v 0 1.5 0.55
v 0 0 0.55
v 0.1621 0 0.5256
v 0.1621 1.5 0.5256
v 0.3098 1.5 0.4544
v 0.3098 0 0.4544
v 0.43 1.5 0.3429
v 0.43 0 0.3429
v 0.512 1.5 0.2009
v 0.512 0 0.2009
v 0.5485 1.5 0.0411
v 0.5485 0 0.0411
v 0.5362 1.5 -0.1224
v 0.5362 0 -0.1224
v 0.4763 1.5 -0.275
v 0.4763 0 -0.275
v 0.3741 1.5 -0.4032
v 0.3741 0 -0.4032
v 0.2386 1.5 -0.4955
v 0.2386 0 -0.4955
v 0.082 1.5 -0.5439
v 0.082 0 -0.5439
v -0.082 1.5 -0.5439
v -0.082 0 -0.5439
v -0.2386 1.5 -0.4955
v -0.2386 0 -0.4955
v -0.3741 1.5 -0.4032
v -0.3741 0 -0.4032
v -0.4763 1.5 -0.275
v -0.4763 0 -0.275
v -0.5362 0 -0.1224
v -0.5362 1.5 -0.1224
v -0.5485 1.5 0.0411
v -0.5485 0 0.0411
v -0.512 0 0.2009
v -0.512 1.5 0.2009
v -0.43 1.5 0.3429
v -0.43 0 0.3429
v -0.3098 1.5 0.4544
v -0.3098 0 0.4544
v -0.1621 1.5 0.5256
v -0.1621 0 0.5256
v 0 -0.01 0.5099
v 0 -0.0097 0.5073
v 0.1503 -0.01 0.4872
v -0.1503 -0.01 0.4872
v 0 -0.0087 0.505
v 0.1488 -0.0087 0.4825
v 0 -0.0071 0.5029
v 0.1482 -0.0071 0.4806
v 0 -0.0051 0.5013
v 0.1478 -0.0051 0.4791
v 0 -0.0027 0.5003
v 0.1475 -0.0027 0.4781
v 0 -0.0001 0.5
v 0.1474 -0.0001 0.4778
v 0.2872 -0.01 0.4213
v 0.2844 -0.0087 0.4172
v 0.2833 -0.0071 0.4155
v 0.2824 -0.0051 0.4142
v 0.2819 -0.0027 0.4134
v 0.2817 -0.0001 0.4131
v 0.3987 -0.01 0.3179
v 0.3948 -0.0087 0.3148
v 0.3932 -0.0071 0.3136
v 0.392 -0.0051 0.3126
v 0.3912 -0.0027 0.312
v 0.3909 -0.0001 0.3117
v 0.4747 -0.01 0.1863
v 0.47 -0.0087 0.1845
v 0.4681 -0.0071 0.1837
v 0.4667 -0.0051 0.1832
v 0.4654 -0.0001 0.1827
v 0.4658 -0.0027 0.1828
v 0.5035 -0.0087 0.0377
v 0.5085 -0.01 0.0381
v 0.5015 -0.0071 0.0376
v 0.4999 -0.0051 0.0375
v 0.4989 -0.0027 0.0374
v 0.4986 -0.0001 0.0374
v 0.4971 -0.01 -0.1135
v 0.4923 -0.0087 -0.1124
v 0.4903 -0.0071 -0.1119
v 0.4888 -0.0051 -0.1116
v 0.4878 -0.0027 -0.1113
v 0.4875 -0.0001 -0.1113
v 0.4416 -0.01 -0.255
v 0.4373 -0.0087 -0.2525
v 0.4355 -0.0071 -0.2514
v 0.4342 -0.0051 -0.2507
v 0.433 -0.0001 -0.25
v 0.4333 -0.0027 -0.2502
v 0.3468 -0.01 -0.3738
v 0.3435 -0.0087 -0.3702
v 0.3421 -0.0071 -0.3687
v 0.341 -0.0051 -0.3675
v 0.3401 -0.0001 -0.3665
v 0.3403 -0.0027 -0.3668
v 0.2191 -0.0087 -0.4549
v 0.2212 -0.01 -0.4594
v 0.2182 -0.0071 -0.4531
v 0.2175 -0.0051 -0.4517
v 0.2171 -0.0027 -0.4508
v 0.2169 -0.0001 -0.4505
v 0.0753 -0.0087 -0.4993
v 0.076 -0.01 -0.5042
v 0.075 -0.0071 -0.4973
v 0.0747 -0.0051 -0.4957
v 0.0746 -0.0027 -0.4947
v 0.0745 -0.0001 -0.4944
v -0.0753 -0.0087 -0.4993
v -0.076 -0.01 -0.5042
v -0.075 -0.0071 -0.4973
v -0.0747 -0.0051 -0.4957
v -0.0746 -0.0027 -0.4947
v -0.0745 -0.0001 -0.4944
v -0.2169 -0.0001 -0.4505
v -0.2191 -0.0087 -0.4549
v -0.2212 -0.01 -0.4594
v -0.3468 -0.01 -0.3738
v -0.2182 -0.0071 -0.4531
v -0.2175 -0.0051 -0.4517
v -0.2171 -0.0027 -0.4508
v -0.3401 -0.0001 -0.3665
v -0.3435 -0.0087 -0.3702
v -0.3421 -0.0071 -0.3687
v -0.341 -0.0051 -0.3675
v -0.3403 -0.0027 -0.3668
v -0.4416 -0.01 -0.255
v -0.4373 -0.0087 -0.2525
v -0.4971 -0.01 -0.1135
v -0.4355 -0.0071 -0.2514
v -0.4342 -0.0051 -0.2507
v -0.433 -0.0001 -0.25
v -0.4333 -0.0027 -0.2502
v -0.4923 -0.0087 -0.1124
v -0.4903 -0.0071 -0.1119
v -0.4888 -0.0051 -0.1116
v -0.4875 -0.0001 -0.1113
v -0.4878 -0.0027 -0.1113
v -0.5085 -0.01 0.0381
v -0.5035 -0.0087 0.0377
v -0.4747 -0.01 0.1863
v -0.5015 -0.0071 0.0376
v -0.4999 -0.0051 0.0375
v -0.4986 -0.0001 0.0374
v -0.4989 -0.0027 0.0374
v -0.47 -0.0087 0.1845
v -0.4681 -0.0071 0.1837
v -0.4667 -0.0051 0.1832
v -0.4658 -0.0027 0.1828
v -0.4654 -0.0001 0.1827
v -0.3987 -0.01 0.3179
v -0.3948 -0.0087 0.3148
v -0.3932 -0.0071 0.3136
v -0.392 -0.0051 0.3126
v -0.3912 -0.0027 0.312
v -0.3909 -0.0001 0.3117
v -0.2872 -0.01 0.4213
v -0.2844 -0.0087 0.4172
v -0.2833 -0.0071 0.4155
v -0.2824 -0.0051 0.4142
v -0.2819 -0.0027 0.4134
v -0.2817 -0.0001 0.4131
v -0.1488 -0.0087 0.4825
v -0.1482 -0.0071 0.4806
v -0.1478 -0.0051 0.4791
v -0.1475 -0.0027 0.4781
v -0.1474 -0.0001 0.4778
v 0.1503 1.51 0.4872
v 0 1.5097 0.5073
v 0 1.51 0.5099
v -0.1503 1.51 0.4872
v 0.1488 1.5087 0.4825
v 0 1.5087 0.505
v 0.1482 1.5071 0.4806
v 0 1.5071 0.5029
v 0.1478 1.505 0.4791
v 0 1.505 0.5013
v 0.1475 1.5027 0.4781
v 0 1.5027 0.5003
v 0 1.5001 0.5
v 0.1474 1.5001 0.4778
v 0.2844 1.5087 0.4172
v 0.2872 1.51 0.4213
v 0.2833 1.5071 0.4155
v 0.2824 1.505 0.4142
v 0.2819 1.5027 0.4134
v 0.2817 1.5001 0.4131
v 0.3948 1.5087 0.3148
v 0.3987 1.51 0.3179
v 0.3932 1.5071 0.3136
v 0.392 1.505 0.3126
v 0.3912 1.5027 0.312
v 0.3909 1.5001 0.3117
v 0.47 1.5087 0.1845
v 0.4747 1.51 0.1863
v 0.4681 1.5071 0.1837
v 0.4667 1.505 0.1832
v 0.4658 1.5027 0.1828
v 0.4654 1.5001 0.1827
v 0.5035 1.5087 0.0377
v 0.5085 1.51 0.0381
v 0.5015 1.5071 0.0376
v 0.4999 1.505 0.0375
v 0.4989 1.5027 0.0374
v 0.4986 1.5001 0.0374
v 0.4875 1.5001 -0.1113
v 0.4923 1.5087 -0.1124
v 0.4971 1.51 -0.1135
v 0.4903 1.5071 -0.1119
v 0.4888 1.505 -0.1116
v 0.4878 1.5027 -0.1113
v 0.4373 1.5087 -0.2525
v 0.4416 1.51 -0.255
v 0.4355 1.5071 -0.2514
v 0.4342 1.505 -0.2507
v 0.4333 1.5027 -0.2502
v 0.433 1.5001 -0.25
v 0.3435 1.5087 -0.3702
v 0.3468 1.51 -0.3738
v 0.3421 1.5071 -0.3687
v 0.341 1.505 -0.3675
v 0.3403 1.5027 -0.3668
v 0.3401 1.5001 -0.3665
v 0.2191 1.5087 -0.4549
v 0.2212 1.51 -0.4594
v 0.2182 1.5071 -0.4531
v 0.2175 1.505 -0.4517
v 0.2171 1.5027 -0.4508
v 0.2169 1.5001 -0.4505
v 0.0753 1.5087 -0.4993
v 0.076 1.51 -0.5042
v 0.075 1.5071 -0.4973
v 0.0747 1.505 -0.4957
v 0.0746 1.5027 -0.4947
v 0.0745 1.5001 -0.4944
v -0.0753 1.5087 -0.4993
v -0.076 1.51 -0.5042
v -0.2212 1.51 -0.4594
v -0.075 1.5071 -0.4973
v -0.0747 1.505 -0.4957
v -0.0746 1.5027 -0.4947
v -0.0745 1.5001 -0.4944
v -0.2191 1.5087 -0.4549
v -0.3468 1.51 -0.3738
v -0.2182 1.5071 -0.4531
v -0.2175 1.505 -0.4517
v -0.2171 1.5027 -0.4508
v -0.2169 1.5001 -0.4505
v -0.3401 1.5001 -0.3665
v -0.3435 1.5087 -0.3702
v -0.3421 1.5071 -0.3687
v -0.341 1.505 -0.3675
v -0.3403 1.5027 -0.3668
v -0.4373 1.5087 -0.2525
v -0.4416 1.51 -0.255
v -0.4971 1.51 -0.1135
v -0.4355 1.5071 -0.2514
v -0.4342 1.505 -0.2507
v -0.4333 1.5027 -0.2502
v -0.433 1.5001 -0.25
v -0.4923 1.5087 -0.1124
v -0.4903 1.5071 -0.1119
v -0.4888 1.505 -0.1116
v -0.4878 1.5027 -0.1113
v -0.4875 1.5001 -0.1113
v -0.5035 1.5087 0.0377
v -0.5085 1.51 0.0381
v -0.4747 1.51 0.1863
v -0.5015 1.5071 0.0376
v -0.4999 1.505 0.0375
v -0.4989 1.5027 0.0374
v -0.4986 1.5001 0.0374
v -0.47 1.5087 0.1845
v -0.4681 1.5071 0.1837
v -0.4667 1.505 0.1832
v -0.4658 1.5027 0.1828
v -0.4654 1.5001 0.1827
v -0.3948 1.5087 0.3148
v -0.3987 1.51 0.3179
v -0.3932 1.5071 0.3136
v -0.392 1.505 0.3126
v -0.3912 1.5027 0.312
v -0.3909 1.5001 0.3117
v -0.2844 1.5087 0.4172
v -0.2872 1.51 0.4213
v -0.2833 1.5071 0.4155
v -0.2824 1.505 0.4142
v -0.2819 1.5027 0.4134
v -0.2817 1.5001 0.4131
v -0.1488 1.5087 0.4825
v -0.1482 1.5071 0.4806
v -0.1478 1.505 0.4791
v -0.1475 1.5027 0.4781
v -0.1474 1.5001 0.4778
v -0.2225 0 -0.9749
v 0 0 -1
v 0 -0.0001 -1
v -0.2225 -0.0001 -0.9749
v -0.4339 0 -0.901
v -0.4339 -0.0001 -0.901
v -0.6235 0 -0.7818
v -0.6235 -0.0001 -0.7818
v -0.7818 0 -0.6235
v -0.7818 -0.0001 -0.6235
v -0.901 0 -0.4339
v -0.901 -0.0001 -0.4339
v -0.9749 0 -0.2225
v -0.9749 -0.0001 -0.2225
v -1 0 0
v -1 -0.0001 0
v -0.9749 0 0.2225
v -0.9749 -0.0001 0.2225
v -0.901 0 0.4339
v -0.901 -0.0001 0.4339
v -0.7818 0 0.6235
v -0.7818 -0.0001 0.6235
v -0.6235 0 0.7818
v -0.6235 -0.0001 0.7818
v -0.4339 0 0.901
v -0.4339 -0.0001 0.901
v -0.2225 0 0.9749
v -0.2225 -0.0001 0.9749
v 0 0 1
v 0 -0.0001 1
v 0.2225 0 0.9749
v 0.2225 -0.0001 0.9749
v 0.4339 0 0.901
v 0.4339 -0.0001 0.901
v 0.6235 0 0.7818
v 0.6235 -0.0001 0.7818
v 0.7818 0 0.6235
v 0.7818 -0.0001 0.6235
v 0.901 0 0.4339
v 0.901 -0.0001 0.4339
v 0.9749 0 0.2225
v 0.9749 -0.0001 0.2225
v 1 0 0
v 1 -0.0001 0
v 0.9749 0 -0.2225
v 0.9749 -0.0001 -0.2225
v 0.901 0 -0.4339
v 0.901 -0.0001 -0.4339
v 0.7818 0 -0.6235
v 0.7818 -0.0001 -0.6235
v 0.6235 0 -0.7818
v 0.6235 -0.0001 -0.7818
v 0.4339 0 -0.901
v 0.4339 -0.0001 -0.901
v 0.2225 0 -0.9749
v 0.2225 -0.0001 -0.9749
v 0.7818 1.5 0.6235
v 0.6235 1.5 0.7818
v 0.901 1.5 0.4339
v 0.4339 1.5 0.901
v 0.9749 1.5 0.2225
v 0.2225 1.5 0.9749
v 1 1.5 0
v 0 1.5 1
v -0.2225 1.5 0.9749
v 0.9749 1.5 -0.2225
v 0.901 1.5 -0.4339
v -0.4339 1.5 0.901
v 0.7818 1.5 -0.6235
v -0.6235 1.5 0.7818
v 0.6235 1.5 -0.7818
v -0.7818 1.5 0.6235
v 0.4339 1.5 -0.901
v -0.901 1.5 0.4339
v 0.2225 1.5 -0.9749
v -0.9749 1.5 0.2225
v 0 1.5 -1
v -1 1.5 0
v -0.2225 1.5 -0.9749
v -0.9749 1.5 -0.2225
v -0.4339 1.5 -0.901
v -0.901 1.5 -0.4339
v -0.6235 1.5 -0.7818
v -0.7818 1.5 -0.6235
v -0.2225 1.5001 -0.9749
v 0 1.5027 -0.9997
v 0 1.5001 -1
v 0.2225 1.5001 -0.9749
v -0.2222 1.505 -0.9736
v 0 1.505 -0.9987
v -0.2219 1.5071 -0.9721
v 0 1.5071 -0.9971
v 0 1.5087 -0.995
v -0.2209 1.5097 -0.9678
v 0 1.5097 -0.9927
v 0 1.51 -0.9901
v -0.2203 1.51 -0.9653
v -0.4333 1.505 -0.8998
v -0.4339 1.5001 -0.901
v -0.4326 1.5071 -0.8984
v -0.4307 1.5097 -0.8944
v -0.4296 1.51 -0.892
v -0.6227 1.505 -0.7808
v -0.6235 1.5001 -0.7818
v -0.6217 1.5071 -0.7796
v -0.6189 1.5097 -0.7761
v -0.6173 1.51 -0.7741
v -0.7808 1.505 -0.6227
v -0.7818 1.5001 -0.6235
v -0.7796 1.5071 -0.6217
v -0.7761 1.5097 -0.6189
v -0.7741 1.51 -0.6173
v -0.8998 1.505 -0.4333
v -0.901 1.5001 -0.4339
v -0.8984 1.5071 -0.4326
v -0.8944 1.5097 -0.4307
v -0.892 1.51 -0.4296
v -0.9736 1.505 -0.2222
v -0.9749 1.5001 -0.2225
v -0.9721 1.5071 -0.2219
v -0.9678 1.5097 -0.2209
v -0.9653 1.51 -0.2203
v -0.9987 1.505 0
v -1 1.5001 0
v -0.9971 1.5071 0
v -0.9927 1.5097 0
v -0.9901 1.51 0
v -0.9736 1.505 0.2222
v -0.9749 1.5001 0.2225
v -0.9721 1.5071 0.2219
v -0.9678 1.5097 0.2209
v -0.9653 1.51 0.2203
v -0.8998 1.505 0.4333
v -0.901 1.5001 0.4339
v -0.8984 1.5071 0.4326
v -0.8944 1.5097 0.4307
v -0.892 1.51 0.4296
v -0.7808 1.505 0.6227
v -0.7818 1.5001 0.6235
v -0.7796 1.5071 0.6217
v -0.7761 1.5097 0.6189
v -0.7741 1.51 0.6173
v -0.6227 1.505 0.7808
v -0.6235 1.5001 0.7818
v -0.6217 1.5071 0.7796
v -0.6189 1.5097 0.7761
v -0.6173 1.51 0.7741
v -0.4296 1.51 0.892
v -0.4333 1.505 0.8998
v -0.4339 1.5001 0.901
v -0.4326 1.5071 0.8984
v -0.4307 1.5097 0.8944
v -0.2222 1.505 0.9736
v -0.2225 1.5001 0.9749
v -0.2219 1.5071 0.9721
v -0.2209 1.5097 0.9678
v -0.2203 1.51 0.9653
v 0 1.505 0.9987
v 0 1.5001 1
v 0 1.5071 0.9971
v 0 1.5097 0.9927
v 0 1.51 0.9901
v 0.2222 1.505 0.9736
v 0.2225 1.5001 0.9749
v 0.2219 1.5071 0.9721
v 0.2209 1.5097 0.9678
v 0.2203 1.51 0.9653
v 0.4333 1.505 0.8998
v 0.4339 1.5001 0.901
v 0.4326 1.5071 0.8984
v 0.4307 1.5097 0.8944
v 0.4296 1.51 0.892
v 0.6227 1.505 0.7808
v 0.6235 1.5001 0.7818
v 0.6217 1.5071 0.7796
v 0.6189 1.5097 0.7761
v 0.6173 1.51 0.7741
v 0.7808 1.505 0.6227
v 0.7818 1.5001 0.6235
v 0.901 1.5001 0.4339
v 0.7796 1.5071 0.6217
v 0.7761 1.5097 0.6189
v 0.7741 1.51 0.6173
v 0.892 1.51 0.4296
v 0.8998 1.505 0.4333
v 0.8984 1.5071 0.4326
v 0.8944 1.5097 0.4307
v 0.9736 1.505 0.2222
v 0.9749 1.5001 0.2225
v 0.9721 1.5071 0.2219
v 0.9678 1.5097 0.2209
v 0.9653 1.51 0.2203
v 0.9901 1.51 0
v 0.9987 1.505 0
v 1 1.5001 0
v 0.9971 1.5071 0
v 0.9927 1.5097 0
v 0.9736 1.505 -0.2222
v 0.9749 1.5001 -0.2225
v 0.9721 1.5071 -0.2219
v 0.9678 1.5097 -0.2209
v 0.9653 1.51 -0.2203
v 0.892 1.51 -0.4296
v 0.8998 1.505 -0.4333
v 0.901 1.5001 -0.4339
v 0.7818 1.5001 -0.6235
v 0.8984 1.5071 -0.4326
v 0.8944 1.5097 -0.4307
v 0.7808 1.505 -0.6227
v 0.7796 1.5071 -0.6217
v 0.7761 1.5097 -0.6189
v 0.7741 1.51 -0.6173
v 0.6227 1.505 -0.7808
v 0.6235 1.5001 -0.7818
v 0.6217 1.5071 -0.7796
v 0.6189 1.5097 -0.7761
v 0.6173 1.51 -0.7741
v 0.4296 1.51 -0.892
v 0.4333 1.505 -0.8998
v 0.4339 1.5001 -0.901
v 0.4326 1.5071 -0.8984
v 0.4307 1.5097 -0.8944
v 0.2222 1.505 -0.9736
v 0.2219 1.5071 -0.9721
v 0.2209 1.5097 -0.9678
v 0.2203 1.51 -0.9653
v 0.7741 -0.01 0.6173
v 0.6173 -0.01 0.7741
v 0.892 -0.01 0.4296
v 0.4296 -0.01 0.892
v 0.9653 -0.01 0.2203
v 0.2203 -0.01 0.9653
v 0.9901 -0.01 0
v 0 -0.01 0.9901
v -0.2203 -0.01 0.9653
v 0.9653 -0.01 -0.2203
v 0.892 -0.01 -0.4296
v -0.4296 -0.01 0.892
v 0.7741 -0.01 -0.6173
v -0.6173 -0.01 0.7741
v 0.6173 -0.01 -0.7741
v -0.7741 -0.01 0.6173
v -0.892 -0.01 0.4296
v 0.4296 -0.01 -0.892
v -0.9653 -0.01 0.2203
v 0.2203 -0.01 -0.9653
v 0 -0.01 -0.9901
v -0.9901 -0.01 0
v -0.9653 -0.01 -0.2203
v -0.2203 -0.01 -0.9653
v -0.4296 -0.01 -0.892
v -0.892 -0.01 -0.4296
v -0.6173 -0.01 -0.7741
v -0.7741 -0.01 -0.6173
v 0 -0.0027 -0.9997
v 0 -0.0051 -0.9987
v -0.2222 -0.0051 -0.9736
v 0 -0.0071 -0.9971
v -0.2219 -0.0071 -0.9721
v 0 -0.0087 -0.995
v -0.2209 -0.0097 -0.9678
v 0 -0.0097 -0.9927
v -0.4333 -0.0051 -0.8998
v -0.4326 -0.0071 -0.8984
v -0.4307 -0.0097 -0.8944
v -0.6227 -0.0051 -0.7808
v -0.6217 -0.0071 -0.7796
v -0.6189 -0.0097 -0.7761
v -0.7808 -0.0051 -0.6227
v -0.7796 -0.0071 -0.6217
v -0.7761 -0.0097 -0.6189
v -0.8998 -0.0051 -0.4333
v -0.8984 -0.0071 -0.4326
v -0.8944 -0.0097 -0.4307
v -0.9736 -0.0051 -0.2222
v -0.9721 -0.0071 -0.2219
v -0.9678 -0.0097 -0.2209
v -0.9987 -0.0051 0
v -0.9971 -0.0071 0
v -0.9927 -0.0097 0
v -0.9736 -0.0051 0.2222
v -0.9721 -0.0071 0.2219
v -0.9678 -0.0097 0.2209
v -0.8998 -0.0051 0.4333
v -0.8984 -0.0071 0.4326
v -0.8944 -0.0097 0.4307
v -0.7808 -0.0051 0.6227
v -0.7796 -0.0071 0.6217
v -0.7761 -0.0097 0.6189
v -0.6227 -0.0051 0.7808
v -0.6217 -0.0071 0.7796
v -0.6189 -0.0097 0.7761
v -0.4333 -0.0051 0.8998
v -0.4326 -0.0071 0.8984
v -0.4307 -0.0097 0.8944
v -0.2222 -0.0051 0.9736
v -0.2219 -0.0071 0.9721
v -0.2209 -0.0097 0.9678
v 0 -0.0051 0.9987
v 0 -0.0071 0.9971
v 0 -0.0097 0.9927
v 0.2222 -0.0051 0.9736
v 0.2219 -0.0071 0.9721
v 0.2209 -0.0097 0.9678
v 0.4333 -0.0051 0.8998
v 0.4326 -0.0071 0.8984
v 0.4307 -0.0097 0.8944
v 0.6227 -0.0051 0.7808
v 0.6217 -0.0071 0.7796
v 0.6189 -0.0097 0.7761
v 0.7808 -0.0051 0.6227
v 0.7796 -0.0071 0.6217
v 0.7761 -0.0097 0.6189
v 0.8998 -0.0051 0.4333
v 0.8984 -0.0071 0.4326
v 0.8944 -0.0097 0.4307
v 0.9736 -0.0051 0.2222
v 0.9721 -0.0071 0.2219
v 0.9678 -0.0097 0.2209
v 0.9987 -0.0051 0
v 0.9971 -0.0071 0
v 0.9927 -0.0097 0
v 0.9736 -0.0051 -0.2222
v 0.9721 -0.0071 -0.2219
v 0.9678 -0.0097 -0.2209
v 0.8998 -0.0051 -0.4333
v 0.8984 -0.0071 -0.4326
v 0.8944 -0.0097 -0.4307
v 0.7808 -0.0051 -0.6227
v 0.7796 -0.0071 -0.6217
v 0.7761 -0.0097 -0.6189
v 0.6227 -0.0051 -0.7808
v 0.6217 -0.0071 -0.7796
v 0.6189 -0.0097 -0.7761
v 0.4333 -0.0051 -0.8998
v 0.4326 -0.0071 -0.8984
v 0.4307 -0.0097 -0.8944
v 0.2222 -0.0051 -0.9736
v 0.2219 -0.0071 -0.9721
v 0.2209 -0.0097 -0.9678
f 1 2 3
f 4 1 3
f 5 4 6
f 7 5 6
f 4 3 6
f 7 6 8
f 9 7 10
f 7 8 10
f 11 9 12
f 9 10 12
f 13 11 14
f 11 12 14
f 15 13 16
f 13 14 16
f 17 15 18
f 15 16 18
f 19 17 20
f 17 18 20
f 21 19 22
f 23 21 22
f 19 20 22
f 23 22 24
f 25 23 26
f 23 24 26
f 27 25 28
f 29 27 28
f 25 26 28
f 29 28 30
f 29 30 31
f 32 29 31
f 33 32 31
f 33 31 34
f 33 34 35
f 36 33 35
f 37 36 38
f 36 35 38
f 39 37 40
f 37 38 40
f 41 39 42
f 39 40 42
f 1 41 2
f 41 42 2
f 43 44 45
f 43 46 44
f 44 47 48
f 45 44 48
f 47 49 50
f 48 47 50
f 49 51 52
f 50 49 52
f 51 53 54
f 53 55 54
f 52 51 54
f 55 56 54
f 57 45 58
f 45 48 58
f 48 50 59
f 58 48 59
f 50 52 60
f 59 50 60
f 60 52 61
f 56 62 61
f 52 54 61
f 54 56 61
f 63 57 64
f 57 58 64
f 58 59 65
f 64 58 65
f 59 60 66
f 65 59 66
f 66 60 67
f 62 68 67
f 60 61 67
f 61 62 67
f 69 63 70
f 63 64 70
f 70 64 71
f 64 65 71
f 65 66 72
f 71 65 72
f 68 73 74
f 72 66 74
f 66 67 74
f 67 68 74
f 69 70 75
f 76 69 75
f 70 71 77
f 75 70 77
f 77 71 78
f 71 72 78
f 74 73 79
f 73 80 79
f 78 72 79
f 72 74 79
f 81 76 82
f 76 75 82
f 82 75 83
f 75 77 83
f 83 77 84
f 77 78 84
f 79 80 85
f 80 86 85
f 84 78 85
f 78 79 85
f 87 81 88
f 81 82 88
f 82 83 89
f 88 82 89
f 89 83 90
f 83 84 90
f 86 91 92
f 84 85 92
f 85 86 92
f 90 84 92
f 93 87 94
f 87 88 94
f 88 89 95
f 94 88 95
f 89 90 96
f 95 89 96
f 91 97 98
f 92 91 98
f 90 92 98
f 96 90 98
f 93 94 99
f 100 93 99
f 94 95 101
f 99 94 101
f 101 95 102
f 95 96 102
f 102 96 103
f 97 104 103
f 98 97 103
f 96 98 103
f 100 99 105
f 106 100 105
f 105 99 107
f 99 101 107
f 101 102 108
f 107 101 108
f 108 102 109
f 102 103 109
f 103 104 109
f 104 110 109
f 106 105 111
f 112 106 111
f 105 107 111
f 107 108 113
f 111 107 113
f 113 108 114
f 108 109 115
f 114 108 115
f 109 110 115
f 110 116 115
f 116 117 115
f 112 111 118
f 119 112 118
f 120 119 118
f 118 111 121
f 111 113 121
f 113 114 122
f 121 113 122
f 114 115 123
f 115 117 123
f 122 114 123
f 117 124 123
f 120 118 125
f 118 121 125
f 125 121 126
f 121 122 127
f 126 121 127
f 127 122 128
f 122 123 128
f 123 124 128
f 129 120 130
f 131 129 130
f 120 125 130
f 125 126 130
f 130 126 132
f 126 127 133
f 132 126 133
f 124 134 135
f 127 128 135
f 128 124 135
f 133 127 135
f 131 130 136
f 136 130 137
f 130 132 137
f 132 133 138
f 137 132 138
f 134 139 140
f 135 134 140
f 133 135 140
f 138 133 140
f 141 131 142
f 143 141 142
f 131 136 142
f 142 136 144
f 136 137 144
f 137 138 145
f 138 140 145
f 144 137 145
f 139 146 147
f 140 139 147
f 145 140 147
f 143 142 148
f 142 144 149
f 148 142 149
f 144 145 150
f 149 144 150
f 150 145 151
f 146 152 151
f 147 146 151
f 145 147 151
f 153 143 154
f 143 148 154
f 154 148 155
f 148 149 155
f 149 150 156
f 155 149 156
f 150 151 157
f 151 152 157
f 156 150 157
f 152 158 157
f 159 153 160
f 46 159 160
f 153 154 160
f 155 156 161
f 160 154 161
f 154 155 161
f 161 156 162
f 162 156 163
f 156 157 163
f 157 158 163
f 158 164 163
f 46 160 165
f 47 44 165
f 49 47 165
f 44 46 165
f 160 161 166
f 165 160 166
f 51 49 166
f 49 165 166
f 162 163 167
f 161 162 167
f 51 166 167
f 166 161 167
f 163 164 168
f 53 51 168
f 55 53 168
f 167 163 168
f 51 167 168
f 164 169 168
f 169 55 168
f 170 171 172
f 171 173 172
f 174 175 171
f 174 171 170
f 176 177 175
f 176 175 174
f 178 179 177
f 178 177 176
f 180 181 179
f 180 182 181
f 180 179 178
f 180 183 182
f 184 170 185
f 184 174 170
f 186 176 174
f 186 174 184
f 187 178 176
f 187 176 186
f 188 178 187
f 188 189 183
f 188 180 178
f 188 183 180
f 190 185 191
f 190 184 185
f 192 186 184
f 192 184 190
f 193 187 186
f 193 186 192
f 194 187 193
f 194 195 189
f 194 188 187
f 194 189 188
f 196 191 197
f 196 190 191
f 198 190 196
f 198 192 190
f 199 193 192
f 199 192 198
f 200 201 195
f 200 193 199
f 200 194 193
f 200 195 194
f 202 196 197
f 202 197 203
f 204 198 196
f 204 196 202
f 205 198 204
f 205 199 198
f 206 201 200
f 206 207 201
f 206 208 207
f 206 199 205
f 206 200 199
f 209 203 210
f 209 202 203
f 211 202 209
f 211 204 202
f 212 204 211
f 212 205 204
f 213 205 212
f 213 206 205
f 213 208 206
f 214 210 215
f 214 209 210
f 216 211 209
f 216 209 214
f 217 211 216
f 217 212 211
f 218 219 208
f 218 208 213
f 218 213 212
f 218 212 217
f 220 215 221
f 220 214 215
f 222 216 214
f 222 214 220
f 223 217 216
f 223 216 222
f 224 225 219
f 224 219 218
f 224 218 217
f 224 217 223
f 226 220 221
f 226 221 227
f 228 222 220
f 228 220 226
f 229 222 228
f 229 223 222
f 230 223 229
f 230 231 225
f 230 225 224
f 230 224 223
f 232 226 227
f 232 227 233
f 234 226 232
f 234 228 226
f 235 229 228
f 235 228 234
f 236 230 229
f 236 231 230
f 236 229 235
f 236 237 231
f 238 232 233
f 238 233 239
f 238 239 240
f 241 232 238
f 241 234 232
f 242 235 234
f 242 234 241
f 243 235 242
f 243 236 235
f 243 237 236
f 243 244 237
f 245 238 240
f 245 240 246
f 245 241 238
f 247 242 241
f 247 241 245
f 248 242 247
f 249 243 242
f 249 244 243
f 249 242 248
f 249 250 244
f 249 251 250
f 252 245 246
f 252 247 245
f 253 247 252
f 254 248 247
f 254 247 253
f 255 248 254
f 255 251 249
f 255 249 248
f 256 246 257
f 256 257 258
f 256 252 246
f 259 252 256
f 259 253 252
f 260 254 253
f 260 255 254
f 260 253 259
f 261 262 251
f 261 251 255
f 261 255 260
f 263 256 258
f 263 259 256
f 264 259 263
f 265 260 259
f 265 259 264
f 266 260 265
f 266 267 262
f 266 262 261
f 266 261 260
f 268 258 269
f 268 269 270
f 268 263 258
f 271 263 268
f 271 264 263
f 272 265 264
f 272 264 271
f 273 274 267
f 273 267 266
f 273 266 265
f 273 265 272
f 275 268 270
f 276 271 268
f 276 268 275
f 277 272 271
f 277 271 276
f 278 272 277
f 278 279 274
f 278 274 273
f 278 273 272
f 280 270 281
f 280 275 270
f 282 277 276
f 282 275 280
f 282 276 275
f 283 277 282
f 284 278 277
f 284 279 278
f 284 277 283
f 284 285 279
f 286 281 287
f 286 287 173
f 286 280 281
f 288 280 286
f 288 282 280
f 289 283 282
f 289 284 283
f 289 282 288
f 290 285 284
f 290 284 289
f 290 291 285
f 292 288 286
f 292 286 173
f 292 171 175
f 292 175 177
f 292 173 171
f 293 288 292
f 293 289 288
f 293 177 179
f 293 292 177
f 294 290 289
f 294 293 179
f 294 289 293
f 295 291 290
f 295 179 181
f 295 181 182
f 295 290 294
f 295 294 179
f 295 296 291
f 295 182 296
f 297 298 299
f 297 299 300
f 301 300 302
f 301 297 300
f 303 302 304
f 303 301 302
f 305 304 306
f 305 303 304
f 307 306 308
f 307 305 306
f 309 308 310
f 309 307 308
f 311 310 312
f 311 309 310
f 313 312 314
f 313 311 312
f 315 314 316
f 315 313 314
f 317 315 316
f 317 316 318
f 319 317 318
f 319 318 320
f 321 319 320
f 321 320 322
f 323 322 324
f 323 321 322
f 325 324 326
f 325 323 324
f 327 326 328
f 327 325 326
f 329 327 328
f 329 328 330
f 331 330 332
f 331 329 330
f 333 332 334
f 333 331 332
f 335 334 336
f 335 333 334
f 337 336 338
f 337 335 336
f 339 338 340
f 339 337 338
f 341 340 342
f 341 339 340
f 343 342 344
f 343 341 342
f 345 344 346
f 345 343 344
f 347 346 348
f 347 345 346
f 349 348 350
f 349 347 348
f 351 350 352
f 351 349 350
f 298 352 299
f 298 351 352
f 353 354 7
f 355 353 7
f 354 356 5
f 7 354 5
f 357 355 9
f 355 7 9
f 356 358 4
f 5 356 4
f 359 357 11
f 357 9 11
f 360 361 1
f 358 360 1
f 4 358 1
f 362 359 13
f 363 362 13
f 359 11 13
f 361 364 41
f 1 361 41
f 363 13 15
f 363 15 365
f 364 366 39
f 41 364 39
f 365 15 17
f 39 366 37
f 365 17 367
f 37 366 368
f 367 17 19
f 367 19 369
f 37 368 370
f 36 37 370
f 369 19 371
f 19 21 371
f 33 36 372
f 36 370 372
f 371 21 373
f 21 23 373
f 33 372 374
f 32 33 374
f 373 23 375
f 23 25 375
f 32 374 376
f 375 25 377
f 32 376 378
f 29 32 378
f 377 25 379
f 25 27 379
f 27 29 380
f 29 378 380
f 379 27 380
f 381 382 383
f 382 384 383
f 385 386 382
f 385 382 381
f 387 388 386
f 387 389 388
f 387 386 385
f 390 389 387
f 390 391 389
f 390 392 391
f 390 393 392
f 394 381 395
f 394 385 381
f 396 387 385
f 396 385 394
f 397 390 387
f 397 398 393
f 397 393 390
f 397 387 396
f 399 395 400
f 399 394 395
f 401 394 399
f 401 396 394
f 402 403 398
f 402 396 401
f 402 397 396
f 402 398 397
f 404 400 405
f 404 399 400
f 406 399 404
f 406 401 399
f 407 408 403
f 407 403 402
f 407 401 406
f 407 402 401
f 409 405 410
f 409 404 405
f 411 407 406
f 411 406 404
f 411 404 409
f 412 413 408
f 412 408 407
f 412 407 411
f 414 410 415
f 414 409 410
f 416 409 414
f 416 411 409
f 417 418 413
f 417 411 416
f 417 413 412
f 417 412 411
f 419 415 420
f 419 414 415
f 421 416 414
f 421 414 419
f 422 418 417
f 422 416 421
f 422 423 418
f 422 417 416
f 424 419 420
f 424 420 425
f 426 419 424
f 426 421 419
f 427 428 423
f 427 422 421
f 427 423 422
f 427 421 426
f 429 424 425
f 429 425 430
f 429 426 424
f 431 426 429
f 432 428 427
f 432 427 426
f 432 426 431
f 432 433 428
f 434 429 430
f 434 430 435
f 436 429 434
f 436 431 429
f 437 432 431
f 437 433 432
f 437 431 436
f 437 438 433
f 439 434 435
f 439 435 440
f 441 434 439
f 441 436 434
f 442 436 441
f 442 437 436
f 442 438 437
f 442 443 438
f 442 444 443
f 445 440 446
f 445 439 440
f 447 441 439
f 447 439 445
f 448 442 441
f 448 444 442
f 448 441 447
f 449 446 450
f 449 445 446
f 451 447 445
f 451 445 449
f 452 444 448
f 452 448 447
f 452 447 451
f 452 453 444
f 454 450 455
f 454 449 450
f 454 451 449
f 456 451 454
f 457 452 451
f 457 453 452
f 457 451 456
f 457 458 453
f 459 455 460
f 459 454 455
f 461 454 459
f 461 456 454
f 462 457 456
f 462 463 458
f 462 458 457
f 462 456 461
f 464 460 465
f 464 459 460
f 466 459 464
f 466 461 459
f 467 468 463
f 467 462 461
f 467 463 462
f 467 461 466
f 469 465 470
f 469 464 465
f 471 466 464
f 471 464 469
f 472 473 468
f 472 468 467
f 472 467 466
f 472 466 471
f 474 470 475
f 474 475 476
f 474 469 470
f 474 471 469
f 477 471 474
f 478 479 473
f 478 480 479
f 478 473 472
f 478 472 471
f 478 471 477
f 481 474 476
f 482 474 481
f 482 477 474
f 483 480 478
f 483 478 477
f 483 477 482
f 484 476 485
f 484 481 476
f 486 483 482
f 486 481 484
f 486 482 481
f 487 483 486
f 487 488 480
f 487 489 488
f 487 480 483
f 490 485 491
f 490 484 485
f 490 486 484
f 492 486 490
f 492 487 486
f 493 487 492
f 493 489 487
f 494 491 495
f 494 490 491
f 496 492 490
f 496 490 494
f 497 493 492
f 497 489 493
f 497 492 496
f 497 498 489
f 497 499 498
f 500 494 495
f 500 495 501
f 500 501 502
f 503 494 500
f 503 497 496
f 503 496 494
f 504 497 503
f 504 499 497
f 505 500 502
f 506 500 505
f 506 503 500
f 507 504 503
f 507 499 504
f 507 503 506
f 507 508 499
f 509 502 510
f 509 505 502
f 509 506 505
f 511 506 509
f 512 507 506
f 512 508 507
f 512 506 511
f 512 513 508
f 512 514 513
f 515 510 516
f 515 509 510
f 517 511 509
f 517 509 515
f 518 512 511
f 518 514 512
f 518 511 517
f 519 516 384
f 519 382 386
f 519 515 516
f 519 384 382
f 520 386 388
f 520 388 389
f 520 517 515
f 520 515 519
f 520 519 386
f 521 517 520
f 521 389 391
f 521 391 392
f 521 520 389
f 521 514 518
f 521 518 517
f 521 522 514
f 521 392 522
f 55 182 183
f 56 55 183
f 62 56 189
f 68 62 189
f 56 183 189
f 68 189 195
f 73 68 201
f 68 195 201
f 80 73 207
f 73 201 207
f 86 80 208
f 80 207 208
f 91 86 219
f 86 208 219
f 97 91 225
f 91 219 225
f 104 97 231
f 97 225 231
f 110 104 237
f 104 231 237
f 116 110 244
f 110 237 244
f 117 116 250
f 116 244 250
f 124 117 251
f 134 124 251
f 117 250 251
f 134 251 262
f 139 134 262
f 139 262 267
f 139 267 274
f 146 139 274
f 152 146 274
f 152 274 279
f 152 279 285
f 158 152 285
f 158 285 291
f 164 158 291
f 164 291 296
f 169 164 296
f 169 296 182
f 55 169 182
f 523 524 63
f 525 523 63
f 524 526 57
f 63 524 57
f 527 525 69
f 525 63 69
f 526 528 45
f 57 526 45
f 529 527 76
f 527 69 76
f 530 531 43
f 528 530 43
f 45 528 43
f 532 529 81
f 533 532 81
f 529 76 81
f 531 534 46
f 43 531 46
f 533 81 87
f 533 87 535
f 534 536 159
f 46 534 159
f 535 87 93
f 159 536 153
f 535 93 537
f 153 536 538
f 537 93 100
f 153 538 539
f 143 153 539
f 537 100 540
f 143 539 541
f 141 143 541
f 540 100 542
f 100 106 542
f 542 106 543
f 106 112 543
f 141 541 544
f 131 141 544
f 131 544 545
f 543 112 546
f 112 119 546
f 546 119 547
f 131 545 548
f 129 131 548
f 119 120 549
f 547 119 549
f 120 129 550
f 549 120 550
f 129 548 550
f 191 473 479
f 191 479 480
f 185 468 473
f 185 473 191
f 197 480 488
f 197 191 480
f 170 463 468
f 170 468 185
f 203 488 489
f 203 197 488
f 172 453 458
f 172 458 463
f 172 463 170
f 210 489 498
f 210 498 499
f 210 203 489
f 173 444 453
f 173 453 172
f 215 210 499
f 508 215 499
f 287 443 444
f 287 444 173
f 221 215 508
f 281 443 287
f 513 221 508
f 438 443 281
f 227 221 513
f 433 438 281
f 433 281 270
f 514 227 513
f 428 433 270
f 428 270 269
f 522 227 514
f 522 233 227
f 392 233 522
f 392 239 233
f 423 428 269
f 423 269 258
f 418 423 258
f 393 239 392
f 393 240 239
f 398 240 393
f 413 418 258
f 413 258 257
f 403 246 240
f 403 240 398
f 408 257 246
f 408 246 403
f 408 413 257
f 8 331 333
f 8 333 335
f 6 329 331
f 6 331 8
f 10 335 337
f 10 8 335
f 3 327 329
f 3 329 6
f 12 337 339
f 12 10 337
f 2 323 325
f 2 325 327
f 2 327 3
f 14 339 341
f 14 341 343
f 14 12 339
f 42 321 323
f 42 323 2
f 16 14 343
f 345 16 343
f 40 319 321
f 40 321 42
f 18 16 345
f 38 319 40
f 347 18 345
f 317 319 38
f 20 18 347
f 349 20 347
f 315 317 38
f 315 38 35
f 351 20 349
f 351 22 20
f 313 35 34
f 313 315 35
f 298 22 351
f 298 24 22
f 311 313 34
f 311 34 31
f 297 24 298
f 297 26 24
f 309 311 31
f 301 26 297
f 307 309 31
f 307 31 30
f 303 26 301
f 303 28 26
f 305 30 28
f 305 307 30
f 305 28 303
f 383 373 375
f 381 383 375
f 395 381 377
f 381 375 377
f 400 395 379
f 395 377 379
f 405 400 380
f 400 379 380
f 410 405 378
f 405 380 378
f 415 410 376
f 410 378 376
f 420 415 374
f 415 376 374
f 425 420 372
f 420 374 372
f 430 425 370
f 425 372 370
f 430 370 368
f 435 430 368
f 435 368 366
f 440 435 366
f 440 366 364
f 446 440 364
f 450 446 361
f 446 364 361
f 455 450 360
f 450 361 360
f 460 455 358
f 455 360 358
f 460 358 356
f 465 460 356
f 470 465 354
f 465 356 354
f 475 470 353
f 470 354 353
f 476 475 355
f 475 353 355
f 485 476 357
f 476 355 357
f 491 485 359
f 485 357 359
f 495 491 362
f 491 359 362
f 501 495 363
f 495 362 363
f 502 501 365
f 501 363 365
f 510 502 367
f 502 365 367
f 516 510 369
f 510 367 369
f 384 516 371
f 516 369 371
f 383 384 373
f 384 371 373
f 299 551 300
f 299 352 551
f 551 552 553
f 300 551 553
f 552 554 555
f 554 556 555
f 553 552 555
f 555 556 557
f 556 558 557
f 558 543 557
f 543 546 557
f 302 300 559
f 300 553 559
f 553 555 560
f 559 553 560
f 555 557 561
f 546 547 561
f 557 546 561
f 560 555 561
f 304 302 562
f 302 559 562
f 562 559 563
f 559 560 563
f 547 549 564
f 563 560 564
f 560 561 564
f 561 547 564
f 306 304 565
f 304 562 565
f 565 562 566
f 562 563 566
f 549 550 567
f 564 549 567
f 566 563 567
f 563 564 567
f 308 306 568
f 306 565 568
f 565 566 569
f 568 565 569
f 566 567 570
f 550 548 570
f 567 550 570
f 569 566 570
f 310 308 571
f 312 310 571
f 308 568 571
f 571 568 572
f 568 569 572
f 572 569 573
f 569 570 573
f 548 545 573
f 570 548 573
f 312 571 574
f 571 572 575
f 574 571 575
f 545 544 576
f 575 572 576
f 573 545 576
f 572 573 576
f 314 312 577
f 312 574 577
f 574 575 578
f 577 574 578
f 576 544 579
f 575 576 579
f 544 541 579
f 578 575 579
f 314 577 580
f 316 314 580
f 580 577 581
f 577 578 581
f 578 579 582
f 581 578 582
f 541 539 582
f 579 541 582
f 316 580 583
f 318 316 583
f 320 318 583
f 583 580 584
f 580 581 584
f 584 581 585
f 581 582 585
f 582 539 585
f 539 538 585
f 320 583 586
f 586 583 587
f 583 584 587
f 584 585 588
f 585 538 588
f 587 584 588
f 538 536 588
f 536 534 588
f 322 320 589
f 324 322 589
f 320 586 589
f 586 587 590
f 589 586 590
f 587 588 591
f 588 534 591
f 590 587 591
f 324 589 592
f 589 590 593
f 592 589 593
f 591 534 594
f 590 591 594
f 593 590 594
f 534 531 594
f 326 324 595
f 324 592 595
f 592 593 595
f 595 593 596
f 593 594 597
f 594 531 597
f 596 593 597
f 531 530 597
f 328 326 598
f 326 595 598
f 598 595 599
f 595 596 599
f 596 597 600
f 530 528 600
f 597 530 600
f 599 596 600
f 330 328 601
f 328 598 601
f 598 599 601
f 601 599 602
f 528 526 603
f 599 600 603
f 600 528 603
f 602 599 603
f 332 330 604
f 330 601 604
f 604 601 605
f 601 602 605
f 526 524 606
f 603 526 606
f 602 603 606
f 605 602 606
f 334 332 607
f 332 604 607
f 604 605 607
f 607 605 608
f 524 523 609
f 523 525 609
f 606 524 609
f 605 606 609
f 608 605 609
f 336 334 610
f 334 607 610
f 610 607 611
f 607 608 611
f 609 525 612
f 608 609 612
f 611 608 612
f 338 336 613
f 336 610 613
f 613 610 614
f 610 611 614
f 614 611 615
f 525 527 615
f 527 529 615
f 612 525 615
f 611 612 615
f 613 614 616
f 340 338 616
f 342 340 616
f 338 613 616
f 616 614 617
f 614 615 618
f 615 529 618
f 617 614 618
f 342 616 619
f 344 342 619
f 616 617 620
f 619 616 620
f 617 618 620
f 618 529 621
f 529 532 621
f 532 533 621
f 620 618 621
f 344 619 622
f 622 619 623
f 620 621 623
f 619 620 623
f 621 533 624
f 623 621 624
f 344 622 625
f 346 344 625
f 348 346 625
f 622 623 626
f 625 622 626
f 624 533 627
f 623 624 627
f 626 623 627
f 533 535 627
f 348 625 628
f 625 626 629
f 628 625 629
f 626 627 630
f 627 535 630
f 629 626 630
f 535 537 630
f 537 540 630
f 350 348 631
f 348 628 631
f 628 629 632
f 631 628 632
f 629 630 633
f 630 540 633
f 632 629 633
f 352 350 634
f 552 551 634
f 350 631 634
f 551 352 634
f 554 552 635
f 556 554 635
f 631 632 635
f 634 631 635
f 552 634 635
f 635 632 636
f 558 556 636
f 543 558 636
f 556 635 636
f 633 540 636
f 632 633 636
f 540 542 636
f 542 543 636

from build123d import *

# Parameters (mm, degrees)
SKETCH1_R            = 0.55
SKETCH1_R_2          = 0.5
BOSS_EXTRUDE1_DEPTH  = 1.5
SKETCH2_R            = 1
SKETCH2_R_2          = 0.5
BOSS_EXTRUDE2_DEPTH  = 0.01
FILLET1_R            = 0.01
FILLET1_OF_MIRROR1_R = 0.01


with BuildPart() as part:
    # Sketch1 → Boss-Extrude1 (new body)
    with BuildSketch(Plane(origin=(0, 0, 0), x_dir=(1, 0, 0), z_dir=(0, 1, 0))):
        with Locations(Location((0, 0, 0), (0, 0, 270))):
            Circle(SKETCH1_R)
        with Locations(Location((0, 0, 0), (0, 0, 270))):
            Circle(SKETCH1_R_2, mode=Mode.SUBTRACT)
    extrude(amount=BOSS_EXTRUDE1_DEPTH)

    # Sketch2 → Boss-Extrude2 (add)
    with BuildSketch(Plane(origin=(0, 1.5, 0), x_dir=(1, 0, 0), z_dir=(0, 1, 0))):
        with Locations(Location((0, 0, 0), (0, 0, 90))):
            Circle(SKETCH2_R)
        with Locations(Location((0, 0, 0), (0, 0, 270))):
            Circle(SKETCH2_R_2, mode=Mode.SUBTRACT)
    boss_extrude2 = extrude(amount=BOSS_EXTRUDE2_DEPTH)

    # Fillet1
    fillet1_edges = [part.edges().sort_by_distance(p)[0] for p in [
        (0, 1.51, 1),
        (0, 1.51, -0.5),
    ]]
    fillet(fillet1_edges, radius=FILLET1_R - 0.0001)  # a hair under: the kernel refuses the full size

    # Mirror1: Boss-Extrude2 across plane
    add(boss_extrude2.mirror(Plane.ZX.offset(0.75)))

    # Fillet1 of Mirror1
    fillet1_of_mirror1_edges = [part.edges().sort_by_distance(p)[0] for p in [
        (0, -0.01, 1),
        (0, -0.01, -0.5),
    ]]
    fillet(fillet1_of_mirror1_edges, radius=FILLET1_OF_MIRROR1_R - 0.0001)  # a hair under: the kernel refuses the full size


solid = part.part
